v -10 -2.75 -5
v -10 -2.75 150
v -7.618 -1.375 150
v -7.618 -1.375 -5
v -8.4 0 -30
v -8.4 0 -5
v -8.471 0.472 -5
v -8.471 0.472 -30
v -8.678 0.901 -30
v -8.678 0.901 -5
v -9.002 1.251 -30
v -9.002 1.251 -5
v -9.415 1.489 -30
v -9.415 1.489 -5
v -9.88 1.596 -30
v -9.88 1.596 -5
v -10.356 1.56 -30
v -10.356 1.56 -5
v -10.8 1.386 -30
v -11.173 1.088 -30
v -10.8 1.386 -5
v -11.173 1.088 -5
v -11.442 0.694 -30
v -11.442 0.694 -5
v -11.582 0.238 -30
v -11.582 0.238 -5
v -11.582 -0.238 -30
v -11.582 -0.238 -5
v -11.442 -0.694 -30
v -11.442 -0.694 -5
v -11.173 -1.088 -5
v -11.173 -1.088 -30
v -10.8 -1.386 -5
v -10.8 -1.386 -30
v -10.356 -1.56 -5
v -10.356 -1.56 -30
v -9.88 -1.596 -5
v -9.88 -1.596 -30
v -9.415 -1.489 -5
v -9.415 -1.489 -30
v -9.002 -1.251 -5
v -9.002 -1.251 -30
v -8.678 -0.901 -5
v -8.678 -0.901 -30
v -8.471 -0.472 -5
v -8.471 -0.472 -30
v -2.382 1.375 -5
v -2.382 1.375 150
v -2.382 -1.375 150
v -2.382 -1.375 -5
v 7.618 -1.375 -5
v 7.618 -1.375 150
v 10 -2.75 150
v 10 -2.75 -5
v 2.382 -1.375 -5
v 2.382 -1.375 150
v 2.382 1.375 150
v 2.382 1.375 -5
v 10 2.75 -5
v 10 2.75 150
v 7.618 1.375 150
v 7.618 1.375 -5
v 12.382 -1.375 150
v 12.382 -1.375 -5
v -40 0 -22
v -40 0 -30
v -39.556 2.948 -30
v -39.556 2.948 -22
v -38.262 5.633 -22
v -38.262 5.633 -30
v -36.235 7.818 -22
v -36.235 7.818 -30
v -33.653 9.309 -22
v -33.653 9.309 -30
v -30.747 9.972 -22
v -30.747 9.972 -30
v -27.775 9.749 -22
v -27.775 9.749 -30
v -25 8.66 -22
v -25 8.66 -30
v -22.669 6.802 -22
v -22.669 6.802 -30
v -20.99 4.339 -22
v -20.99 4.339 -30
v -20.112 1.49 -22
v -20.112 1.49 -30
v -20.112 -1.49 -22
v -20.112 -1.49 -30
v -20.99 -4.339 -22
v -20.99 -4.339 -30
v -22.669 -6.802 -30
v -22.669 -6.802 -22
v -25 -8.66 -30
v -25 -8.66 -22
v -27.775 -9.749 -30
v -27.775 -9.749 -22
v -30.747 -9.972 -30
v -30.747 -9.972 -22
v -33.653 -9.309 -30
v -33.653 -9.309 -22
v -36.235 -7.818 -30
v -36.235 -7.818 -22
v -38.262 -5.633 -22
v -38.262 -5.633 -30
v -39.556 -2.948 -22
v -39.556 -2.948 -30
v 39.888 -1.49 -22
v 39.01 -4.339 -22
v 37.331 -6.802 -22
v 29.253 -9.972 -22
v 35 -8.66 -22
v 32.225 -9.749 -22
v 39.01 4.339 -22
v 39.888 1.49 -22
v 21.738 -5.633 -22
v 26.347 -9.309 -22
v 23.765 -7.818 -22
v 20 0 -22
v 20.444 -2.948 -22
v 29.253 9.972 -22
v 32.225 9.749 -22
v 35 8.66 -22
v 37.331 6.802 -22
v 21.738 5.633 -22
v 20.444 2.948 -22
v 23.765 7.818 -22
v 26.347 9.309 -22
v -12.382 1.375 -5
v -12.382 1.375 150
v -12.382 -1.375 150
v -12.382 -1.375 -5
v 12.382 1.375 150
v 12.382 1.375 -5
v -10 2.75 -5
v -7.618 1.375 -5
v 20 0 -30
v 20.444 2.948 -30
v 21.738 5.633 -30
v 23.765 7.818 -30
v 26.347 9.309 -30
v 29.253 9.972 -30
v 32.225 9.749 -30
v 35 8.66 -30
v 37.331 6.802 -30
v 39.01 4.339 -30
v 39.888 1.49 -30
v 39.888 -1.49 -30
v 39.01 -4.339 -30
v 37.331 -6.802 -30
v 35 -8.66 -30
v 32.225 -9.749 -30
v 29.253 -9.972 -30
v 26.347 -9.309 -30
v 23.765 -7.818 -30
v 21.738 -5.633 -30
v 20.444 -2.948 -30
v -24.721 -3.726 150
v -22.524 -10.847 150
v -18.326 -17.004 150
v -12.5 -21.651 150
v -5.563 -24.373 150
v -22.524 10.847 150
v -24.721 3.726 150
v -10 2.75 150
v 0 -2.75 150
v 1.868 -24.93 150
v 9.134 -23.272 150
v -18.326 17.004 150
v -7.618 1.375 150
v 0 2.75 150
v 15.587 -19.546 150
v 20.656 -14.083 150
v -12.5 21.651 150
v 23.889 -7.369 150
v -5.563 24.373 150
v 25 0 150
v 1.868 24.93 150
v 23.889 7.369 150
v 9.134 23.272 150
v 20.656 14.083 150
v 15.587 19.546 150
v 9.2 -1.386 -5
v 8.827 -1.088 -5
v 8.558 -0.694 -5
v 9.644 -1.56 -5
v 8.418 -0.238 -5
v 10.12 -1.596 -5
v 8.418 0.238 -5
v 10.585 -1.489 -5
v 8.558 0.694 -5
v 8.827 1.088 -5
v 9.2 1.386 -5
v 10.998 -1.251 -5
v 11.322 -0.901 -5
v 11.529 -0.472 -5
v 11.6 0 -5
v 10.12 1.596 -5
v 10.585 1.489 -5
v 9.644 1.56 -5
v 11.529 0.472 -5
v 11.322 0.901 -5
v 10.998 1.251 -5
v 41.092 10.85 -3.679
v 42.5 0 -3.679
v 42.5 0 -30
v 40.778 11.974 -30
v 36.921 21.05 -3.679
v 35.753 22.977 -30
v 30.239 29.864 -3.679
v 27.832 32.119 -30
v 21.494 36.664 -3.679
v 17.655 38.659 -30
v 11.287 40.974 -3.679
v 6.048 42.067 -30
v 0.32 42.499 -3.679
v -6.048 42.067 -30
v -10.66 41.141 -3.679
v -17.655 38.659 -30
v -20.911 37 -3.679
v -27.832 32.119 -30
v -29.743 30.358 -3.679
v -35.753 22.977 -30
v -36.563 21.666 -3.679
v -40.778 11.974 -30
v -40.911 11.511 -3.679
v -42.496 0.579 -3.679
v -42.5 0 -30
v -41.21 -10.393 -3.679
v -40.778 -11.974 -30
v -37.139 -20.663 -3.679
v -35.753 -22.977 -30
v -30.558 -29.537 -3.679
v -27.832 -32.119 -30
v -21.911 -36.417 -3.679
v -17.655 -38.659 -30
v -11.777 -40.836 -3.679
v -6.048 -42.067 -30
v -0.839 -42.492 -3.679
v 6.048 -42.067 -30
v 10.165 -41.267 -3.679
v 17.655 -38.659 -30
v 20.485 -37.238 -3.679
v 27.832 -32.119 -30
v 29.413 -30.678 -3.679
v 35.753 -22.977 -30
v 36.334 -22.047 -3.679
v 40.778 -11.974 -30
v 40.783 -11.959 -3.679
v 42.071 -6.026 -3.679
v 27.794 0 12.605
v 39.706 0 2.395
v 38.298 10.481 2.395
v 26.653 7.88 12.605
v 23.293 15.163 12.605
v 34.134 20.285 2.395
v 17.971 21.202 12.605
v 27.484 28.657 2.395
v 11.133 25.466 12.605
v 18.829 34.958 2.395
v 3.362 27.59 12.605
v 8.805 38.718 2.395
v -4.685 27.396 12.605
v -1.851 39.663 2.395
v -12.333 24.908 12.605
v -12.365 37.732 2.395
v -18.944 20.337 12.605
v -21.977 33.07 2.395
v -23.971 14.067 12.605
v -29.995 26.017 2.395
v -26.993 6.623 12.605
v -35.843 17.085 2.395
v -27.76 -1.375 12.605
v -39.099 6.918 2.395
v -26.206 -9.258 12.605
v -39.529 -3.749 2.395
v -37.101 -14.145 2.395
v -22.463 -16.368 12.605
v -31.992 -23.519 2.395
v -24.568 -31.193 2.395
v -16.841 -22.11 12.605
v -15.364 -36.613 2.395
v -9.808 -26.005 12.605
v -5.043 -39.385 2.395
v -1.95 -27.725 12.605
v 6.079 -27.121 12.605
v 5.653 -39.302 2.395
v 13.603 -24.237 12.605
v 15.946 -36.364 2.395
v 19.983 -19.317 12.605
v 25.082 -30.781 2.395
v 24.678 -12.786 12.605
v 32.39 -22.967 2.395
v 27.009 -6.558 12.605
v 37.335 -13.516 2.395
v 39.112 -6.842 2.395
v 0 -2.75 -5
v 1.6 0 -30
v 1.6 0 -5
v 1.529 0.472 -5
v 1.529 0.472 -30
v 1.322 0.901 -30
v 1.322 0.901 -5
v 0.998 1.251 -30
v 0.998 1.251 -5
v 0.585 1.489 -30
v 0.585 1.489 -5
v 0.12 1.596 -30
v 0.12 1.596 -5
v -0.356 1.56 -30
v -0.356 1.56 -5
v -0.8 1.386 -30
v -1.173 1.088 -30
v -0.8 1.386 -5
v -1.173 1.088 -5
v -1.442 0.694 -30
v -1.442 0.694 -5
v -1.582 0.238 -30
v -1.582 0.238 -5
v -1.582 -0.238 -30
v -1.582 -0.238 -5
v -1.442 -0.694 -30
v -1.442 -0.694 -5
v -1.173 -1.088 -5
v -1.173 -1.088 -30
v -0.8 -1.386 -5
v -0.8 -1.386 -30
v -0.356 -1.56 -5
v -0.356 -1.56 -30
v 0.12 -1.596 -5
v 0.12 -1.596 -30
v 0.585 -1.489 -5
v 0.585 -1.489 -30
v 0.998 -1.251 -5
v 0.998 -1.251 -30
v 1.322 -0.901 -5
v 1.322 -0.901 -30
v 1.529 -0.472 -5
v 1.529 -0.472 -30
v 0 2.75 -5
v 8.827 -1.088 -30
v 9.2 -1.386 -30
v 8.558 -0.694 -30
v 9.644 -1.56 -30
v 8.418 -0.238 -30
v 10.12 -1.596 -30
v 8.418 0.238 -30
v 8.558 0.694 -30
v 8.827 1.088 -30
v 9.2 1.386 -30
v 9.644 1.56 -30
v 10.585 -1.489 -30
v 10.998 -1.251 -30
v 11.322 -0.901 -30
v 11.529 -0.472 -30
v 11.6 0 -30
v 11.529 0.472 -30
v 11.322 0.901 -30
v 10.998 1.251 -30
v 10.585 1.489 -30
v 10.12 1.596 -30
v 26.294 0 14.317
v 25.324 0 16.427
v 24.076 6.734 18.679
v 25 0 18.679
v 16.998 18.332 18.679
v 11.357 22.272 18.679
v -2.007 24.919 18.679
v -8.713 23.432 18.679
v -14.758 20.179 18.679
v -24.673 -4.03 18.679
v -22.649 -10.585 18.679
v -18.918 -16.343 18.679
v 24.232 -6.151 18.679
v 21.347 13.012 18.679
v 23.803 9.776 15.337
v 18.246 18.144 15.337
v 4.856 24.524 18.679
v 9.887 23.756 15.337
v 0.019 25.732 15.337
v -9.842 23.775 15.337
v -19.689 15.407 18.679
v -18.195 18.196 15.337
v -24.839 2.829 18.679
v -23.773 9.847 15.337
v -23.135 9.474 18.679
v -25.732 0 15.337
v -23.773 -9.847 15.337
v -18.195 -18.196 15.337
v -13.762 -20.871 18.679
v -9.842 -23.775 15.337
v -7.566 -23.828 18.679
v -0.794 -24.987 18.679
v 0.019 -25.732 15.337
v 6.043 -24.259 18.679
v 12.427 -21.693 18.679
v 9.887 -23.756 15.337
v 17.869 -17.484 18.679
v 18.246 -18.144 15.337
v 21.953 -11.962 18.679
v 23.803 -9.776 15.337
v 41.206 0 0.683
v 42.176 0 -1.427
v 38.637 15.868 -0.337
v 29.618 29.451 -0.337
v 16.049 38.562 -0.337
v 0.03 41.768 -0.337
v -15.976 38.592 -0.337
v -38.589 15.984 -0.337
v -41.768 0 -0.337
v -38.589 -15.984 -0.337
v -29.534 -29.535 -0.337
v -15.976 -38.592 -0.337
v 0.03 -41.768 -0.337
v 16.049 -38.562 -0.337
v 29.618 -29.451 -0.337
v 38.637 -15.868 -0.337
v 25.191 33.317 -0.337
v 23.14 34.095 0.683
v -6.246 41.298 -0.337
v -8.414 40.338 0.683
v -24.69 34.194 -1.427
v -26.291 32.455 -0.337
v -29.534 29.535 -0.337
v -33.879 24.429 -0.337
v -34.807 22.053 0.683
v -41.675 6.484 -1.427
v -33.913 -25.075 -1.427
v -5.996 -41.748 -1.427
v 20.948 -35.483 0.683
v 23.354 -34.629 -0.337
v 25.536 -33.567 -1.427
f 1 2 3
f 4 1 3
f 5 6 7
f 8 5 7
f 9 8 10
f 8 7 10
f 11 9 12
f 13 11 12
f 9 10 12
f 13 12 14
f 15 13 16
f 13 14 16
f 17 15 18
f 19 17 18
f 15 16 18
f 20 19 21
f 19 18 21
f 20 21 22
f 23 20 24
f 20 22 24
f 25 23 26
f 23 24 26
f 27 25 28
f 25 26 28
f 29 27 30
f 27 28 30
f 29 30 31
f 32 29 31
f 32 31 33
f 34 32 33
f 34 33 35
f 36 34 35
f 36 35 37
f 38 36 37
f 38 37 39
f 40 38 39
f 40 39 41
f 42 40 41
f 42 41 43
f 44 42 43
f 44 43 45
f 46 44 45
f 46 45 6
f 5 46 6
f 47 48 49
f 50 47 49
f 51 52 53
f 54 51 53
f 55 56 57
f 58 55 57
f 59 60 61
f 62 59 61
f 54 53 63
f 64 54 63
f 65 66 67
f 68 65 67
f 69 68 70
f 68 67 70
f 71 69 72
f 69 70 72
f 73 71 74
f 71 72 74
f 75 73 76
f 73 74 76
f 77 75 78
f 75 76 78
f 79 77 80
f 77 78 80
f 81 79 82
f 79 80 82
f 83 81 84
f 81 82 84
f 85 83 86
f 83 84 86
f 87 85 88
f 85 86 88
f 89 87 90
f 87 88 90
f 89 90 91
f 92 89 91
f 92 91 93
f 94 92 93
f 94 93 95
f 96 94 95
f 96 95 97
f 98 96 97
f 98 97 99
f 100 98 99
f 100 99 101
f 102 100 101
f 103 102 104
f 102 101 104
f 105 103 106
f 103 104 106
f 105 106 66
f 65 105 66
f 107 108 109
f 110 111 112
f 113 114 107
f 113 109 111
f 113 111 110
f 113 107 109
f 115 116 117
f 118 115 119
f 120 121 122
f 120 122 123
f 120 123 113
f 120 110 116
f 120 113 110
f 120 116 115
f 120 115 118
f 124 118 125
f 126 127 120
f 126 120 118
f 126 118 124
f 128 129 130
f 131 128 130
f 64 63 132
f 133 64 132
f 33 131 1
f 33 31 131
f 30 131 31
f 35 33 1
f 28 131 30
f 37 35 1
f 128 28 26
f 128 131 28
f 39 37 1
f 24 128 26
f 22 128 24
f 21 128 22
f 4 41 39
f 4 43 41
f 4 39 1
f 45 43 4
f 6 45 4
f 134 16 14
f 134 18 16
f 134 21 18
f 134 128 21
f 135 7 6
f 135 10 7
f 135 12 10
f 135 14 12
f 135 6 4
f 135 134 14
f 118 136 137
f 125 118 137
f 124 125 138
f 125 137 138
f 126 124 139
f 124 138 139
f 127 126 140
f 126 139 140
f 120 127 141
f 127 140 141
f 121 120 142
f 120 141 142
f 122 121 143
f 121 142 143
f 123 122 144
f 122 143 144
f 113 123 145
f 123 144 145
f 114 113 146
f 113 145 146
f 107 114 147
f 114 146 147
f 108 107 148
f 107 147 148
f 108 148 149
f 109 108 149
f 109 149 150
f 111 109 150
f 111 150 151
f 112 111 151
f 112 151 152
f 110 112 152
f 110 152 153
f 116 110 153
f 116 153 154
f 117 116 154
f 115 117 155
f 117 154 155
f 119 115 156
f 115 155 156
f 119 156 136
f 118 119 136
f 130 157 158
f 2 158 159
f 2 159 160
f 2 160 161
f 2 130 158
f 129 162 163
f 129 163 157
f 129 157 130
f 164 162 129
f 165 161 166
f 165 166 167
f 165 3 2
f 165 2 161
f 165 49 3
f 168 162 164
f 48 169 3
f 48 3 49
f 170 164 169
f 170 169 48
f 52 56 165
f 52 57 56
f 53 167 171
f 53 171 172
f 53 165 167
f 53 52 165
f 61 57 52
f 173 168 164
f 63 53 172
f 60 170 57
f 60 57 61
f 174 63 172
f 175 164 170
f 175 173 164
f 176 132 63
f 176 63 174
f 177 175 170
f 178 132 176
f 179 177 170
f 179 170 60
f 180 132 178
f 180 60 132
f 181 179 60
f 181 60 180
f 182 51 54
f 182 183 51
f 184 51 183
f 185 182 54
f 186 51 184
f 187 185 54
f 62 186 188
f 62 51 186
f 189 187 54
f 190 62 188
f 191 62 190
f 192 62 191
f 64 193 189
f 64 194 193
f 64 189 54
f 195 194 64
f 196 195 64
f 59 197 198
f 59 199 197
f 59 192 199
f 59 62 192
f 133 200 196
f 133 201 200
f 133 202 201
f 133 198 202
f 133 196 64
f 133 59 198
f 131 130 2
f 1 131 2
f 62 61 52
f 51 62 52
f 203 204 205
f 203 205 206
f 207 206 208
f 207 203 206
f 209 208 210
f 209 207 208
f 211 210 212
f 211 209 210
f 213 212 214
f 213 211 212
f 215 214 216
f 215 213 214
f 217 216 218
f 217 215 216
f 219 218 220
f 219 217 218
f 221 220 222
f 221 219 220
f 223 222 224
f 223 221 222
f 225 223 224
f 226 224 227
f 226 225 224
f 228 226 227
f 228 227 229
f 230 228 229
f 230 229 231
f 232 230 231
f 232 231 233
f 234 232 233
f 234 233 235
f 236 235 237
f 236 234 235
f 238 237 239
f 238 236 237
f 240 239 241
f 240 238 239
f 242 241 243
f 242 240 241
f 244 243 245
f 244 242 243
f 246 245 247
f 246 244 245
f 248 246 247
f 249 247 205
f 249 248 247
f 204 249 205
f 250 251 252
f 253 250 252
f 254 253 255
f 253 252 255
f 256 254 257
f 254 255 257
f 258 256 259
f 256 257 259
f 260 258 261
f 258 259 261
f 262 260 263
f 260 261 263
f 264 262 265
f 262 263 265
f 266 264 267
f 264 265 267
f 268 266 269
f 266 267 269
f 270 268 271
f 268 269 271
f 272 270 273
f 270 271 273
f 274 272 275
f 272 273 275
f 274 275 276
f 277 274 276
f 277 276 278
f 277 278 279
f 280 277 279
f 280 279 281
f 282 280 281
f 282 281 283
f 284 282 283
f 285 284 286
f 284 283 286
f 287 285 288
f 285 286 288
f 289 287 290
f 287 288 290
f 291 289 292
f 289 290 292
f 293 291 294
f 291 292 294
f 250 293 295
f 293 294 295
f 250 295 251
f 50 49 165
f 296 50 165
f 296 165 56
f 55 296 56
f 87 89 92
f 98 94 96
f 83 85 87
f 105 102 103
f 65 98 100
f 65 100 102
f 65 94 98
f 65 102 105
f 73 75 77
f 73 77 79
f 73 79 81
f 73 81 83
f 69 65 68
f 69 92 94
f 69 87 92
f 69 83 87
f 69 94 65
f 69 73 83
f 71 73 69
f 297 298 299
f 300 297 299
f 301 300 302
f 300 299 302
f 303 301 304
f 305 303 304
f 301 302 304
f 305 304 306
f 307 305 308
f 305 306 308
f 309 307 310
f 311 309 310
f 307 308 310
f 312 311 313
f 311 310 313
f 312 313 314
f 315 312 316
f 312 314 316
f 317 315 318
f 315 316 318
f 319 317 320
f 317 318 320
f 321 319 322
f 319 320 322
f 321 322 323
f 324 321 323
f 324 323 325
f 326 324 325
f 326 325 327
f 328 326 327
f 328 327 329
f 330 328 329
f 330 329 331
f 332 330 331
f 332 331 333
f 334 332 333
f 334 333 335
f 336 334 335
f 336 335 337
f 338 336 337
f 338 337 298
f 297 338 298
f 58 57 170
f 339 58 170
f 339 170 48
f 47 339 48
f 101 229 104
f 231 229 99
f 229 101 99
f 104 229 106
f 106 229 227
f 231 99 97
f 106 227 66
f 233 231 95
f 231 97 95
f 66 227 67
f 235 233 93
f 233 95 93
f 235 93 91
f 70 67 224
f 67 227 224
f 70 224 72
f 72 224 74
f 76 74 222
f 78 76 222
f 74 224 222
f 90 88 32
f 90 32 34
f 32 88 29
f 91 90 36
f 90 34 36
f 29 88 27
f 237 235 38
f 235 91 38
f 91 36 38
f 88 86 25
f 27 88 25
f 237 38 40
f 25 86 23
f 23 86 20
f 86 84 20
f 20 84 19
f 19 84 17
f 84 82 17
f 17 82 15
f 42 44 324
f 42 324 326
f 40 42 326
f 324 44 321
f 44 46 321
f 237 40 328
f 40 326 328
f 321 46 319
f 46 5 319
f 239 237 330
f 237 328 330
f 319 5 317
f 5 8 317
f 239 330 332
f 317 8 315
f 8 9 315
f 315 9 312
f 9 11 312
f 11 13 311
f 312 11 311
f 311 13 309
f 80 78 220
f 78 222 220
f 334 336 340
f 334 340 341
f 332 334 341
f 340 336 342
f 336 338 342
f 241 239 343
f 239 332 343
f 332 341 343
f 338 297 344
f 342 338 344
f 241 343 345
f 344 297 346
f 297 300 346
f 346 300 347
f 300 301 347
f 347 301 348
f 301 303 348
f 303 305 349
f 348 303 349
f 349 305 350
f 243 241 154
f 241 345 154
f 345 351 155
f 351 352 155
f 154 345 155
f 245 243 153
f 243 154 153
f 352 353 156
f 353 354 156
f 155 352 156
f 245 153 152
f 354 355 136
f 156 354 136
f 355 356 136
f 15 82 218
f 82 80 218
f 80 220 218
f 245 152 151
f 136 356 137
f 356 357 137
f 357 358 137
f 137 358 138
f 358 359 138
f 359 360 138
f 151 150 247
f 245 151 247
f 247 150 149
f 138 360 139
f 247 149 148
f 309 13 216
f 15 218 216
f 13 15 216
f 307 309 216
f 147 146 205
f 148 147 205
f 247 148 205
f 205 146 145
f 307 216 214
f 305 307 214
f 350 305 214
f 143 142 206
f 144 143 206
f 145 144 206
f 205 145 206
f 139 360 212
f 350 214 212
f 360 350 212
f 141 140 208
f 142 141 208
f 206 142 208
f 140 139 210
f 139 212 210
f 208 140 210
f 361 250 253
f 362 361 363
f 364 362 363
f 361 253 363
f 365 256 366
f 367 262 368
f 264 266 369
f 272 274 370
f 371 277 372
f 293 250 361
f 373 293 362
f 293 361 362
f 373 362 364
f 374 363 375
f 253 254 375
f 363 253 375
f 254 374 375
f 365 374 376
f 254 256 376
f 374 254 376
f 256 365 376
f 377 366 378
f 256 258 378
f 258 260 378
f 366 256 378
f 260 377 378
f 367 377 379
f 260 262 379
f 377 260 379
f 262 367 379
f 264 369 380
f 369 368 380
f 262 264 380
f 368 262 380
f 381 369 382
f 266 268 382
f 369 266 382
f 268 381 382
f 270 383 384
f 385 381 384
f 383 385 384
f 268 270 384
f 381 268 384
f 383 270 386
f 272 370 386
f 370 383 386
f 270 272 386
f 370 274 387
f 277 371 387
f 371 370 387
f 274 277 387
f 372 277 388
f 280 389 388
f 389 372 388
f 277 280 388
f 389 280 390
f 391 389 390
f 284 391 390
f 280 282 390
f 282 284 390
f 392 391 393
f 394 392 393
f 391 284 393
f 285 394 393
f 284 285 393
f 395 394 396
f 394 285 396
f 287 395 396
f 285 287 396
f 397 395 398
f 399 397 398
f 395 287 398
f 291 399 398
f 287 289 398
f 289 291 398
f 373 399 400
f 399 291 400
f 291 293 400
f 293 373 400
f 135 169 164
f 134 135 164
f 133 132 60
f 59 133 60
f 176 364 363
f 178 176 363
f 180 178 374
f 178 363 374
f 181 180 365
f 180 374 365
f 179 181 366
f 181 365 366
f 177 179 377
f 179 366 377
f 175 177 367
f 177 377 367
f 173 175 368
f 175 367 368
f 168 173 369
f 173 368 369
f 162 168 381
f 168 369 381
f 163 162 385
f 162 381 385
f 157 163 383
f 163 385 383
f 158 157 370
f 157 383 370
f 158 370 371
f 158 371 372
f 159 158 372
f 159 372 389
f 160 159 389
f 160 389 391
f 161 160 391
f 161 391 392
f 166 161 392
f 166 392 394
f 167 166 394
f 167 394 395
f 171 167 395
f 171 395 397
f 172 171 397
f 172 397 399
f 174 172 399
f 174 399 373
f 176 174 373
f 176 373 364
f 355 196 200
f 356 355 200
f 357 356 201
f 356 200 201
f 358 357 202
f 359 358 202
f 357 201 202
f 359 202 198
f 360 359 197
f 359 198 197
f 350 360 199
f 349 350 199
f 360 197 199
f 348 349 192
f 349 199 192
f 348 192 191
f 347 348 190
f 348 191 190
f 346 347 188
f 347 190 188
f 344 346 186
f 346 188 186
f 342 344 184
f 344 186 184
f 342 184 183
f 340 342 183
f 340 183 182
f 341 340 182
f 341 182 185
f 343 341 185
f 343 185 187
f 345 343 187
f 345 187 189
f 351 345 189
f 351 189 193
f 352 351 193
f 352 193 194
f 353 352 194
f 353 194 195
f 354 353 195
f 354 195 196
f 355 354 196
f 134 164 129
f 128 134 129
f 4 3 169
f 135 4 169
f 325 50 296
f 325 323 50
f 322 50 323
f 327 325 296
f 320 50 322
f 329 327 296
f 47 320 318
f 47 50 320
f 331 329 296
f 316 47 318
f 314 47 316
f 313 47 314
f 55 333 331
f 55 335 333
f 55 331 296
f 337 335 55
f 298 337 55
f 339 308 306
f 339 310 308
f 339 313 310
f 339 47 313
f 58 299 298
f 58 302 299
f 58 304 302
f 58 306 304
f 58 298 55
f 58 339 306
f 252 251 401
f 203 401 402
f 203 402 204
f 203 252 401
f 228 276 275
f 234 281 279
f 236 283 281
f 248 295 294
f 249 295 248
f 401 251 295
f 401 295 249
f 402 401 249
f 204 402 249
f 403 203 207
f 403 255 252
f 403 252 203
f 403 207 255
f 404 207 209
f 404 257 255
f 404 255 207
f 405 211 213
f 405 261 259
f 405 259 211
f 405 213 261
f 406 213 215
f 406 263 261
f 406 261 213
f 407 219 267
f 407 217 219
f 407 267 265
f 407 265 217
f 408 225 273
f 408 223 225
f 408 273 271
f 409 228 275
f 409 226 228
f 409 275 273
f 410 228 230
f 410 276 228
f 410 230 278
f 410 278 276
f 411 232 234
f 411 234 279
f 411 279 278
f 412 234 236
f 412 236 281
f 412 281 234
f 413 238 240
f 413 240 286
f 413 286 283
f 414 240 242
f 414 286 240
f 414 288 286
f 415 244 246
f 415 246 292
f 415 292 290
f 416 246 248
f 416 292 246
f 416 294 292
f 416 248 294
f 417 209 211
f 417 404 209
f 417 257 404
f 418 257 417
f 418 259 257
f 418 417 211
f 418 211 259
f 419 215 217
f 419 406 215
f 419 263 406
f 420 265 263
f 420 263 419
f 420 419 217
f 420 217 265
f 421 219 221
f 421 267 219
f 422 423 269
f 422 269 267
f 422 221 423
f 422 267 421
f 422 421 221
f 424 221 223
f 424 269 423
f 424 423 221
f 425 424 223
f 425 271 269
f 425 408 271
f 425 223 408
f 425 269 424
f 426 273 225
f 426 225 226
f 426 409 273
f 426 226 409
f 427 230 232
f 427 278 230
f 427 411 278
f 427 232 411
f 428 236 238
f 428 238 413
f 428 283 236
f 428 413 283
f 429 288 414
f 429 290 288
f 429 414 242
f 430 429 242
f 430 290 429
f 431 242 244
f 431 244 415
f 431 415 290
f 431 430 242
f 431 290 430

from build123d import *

# Parameters (mm, degrees)
SKETCH1_R           = 25
BOSS_EXTRUDE1_DEPTH = 150
SKETCH2_R           = 42.5
BOSS_EXTRUDE2_DEPTH = 30
FILLET4_R           = 8
FILLET5_R           = 8
SKETCH4_R           = 1.6
CUT_EXTRUDE1_DEPTH  = 30
CUT_EXTRUDE4_DEPTH  = 155
SKETCH6_R           = 10
CUT_EXTRUDE5_DEPTH  = 8


with BuildPart() as part:
    # Sketch1 → Boss-Extrude1 (new body)
    with BuildSketch(Plane.XY):
        Circle(SKETCH1_R)
    extrude(amount=BOSS_EXTRUDE1_DEPTH)

    # Sketch2 → Boss-Extrude2 (add)
    with BuildSketch(Plane.XY):
        Circle(SKETCH2_R)
    extrude(amount=-BOSS_EXTRUDE2_DEPTH)

    # Sketch3 → Revolve1 (revolve)
    with BuildSketch(Plane(origin=(0, 0, 0), x_dir=(1, 0, 0), z_dir=(0, 1, 0))):
        Polygon((25, 0), (25, -15), (42.5, 0), align=None)
    revolve(axis=Axis((0, 0, 0), (0, 0, 1)))

    # Fillet4
    fillet4_edges = [part.edges().sort_by_distance(p)[0] for p in [
        (-25, 0, 15),
    ]]
    fillet(fillet4_edges, radius=FILLET4_R)

    # Fillet5
    fillet5_edges = [part.edges().sort_by_distance(p)[0] for p in [
        (-42.5, 0, 0),
    ]]
    fillet(fillet5_edges, radius=FILLET5_R)

    # Sketch4 → Cut-Extrude1 (cut)
    with BuildSketch(Plane.XY):
        Circle(SKETCH4_R)
        with Locations((-10, 0)):
            Circle(SKETCH4_R)
        with Locations((10, 0)):
            Circle(SKETCH4_R)
    extrude(amount=-CUT_EXTRUDE1_DEPTH, mode=Mode.SUBTRACT)

    # Sketch5 → Cut-Extrude4 (cut)
    with BuildSketch(Plane.XY.offset(150)):
        Polygon((-7.61843014, -1.375), (-7.61843014, 1.375), (-10, 2.75), (-12.38156986, 1.375), (-12.38156986, -1.375), (-10, -2.75), align=None)
        Polygon((0, -2.75), (2.38156986, -1.375), (2.38156986, 1.375), (0, 2.75), (-2.38156986, 1.375), (-2.38156986, -1.375), align=None)
        Polygon((10, -2.75), (12.38156986, -1.375), (12.38156986, 1.375), (10, 2.75), (7.61843014, 1.375), (7.61843014, -1.375), align=None)
    extrude(amount=-CUT_EXTRUDE4_DEPTH, mode=Mode.SUBTRACT)

    # Sketch6 → Cut-Extrude5 (cut)
    with BuildSketch(Plane(origin=(0, 0, -30), x_dir=(-1, 0, 0), z_dir=(0, 0, -1))):
        with Locations((30, 0)):
            Circle(SKETCH6_R)
        with Locations((-30, 0)):
            Circle(SKETCH6_R)
    extrude(amount=-CUT_EXTRUDE5_DEPTH, mode=Mode.SUBTRACT)


solid = part.part
